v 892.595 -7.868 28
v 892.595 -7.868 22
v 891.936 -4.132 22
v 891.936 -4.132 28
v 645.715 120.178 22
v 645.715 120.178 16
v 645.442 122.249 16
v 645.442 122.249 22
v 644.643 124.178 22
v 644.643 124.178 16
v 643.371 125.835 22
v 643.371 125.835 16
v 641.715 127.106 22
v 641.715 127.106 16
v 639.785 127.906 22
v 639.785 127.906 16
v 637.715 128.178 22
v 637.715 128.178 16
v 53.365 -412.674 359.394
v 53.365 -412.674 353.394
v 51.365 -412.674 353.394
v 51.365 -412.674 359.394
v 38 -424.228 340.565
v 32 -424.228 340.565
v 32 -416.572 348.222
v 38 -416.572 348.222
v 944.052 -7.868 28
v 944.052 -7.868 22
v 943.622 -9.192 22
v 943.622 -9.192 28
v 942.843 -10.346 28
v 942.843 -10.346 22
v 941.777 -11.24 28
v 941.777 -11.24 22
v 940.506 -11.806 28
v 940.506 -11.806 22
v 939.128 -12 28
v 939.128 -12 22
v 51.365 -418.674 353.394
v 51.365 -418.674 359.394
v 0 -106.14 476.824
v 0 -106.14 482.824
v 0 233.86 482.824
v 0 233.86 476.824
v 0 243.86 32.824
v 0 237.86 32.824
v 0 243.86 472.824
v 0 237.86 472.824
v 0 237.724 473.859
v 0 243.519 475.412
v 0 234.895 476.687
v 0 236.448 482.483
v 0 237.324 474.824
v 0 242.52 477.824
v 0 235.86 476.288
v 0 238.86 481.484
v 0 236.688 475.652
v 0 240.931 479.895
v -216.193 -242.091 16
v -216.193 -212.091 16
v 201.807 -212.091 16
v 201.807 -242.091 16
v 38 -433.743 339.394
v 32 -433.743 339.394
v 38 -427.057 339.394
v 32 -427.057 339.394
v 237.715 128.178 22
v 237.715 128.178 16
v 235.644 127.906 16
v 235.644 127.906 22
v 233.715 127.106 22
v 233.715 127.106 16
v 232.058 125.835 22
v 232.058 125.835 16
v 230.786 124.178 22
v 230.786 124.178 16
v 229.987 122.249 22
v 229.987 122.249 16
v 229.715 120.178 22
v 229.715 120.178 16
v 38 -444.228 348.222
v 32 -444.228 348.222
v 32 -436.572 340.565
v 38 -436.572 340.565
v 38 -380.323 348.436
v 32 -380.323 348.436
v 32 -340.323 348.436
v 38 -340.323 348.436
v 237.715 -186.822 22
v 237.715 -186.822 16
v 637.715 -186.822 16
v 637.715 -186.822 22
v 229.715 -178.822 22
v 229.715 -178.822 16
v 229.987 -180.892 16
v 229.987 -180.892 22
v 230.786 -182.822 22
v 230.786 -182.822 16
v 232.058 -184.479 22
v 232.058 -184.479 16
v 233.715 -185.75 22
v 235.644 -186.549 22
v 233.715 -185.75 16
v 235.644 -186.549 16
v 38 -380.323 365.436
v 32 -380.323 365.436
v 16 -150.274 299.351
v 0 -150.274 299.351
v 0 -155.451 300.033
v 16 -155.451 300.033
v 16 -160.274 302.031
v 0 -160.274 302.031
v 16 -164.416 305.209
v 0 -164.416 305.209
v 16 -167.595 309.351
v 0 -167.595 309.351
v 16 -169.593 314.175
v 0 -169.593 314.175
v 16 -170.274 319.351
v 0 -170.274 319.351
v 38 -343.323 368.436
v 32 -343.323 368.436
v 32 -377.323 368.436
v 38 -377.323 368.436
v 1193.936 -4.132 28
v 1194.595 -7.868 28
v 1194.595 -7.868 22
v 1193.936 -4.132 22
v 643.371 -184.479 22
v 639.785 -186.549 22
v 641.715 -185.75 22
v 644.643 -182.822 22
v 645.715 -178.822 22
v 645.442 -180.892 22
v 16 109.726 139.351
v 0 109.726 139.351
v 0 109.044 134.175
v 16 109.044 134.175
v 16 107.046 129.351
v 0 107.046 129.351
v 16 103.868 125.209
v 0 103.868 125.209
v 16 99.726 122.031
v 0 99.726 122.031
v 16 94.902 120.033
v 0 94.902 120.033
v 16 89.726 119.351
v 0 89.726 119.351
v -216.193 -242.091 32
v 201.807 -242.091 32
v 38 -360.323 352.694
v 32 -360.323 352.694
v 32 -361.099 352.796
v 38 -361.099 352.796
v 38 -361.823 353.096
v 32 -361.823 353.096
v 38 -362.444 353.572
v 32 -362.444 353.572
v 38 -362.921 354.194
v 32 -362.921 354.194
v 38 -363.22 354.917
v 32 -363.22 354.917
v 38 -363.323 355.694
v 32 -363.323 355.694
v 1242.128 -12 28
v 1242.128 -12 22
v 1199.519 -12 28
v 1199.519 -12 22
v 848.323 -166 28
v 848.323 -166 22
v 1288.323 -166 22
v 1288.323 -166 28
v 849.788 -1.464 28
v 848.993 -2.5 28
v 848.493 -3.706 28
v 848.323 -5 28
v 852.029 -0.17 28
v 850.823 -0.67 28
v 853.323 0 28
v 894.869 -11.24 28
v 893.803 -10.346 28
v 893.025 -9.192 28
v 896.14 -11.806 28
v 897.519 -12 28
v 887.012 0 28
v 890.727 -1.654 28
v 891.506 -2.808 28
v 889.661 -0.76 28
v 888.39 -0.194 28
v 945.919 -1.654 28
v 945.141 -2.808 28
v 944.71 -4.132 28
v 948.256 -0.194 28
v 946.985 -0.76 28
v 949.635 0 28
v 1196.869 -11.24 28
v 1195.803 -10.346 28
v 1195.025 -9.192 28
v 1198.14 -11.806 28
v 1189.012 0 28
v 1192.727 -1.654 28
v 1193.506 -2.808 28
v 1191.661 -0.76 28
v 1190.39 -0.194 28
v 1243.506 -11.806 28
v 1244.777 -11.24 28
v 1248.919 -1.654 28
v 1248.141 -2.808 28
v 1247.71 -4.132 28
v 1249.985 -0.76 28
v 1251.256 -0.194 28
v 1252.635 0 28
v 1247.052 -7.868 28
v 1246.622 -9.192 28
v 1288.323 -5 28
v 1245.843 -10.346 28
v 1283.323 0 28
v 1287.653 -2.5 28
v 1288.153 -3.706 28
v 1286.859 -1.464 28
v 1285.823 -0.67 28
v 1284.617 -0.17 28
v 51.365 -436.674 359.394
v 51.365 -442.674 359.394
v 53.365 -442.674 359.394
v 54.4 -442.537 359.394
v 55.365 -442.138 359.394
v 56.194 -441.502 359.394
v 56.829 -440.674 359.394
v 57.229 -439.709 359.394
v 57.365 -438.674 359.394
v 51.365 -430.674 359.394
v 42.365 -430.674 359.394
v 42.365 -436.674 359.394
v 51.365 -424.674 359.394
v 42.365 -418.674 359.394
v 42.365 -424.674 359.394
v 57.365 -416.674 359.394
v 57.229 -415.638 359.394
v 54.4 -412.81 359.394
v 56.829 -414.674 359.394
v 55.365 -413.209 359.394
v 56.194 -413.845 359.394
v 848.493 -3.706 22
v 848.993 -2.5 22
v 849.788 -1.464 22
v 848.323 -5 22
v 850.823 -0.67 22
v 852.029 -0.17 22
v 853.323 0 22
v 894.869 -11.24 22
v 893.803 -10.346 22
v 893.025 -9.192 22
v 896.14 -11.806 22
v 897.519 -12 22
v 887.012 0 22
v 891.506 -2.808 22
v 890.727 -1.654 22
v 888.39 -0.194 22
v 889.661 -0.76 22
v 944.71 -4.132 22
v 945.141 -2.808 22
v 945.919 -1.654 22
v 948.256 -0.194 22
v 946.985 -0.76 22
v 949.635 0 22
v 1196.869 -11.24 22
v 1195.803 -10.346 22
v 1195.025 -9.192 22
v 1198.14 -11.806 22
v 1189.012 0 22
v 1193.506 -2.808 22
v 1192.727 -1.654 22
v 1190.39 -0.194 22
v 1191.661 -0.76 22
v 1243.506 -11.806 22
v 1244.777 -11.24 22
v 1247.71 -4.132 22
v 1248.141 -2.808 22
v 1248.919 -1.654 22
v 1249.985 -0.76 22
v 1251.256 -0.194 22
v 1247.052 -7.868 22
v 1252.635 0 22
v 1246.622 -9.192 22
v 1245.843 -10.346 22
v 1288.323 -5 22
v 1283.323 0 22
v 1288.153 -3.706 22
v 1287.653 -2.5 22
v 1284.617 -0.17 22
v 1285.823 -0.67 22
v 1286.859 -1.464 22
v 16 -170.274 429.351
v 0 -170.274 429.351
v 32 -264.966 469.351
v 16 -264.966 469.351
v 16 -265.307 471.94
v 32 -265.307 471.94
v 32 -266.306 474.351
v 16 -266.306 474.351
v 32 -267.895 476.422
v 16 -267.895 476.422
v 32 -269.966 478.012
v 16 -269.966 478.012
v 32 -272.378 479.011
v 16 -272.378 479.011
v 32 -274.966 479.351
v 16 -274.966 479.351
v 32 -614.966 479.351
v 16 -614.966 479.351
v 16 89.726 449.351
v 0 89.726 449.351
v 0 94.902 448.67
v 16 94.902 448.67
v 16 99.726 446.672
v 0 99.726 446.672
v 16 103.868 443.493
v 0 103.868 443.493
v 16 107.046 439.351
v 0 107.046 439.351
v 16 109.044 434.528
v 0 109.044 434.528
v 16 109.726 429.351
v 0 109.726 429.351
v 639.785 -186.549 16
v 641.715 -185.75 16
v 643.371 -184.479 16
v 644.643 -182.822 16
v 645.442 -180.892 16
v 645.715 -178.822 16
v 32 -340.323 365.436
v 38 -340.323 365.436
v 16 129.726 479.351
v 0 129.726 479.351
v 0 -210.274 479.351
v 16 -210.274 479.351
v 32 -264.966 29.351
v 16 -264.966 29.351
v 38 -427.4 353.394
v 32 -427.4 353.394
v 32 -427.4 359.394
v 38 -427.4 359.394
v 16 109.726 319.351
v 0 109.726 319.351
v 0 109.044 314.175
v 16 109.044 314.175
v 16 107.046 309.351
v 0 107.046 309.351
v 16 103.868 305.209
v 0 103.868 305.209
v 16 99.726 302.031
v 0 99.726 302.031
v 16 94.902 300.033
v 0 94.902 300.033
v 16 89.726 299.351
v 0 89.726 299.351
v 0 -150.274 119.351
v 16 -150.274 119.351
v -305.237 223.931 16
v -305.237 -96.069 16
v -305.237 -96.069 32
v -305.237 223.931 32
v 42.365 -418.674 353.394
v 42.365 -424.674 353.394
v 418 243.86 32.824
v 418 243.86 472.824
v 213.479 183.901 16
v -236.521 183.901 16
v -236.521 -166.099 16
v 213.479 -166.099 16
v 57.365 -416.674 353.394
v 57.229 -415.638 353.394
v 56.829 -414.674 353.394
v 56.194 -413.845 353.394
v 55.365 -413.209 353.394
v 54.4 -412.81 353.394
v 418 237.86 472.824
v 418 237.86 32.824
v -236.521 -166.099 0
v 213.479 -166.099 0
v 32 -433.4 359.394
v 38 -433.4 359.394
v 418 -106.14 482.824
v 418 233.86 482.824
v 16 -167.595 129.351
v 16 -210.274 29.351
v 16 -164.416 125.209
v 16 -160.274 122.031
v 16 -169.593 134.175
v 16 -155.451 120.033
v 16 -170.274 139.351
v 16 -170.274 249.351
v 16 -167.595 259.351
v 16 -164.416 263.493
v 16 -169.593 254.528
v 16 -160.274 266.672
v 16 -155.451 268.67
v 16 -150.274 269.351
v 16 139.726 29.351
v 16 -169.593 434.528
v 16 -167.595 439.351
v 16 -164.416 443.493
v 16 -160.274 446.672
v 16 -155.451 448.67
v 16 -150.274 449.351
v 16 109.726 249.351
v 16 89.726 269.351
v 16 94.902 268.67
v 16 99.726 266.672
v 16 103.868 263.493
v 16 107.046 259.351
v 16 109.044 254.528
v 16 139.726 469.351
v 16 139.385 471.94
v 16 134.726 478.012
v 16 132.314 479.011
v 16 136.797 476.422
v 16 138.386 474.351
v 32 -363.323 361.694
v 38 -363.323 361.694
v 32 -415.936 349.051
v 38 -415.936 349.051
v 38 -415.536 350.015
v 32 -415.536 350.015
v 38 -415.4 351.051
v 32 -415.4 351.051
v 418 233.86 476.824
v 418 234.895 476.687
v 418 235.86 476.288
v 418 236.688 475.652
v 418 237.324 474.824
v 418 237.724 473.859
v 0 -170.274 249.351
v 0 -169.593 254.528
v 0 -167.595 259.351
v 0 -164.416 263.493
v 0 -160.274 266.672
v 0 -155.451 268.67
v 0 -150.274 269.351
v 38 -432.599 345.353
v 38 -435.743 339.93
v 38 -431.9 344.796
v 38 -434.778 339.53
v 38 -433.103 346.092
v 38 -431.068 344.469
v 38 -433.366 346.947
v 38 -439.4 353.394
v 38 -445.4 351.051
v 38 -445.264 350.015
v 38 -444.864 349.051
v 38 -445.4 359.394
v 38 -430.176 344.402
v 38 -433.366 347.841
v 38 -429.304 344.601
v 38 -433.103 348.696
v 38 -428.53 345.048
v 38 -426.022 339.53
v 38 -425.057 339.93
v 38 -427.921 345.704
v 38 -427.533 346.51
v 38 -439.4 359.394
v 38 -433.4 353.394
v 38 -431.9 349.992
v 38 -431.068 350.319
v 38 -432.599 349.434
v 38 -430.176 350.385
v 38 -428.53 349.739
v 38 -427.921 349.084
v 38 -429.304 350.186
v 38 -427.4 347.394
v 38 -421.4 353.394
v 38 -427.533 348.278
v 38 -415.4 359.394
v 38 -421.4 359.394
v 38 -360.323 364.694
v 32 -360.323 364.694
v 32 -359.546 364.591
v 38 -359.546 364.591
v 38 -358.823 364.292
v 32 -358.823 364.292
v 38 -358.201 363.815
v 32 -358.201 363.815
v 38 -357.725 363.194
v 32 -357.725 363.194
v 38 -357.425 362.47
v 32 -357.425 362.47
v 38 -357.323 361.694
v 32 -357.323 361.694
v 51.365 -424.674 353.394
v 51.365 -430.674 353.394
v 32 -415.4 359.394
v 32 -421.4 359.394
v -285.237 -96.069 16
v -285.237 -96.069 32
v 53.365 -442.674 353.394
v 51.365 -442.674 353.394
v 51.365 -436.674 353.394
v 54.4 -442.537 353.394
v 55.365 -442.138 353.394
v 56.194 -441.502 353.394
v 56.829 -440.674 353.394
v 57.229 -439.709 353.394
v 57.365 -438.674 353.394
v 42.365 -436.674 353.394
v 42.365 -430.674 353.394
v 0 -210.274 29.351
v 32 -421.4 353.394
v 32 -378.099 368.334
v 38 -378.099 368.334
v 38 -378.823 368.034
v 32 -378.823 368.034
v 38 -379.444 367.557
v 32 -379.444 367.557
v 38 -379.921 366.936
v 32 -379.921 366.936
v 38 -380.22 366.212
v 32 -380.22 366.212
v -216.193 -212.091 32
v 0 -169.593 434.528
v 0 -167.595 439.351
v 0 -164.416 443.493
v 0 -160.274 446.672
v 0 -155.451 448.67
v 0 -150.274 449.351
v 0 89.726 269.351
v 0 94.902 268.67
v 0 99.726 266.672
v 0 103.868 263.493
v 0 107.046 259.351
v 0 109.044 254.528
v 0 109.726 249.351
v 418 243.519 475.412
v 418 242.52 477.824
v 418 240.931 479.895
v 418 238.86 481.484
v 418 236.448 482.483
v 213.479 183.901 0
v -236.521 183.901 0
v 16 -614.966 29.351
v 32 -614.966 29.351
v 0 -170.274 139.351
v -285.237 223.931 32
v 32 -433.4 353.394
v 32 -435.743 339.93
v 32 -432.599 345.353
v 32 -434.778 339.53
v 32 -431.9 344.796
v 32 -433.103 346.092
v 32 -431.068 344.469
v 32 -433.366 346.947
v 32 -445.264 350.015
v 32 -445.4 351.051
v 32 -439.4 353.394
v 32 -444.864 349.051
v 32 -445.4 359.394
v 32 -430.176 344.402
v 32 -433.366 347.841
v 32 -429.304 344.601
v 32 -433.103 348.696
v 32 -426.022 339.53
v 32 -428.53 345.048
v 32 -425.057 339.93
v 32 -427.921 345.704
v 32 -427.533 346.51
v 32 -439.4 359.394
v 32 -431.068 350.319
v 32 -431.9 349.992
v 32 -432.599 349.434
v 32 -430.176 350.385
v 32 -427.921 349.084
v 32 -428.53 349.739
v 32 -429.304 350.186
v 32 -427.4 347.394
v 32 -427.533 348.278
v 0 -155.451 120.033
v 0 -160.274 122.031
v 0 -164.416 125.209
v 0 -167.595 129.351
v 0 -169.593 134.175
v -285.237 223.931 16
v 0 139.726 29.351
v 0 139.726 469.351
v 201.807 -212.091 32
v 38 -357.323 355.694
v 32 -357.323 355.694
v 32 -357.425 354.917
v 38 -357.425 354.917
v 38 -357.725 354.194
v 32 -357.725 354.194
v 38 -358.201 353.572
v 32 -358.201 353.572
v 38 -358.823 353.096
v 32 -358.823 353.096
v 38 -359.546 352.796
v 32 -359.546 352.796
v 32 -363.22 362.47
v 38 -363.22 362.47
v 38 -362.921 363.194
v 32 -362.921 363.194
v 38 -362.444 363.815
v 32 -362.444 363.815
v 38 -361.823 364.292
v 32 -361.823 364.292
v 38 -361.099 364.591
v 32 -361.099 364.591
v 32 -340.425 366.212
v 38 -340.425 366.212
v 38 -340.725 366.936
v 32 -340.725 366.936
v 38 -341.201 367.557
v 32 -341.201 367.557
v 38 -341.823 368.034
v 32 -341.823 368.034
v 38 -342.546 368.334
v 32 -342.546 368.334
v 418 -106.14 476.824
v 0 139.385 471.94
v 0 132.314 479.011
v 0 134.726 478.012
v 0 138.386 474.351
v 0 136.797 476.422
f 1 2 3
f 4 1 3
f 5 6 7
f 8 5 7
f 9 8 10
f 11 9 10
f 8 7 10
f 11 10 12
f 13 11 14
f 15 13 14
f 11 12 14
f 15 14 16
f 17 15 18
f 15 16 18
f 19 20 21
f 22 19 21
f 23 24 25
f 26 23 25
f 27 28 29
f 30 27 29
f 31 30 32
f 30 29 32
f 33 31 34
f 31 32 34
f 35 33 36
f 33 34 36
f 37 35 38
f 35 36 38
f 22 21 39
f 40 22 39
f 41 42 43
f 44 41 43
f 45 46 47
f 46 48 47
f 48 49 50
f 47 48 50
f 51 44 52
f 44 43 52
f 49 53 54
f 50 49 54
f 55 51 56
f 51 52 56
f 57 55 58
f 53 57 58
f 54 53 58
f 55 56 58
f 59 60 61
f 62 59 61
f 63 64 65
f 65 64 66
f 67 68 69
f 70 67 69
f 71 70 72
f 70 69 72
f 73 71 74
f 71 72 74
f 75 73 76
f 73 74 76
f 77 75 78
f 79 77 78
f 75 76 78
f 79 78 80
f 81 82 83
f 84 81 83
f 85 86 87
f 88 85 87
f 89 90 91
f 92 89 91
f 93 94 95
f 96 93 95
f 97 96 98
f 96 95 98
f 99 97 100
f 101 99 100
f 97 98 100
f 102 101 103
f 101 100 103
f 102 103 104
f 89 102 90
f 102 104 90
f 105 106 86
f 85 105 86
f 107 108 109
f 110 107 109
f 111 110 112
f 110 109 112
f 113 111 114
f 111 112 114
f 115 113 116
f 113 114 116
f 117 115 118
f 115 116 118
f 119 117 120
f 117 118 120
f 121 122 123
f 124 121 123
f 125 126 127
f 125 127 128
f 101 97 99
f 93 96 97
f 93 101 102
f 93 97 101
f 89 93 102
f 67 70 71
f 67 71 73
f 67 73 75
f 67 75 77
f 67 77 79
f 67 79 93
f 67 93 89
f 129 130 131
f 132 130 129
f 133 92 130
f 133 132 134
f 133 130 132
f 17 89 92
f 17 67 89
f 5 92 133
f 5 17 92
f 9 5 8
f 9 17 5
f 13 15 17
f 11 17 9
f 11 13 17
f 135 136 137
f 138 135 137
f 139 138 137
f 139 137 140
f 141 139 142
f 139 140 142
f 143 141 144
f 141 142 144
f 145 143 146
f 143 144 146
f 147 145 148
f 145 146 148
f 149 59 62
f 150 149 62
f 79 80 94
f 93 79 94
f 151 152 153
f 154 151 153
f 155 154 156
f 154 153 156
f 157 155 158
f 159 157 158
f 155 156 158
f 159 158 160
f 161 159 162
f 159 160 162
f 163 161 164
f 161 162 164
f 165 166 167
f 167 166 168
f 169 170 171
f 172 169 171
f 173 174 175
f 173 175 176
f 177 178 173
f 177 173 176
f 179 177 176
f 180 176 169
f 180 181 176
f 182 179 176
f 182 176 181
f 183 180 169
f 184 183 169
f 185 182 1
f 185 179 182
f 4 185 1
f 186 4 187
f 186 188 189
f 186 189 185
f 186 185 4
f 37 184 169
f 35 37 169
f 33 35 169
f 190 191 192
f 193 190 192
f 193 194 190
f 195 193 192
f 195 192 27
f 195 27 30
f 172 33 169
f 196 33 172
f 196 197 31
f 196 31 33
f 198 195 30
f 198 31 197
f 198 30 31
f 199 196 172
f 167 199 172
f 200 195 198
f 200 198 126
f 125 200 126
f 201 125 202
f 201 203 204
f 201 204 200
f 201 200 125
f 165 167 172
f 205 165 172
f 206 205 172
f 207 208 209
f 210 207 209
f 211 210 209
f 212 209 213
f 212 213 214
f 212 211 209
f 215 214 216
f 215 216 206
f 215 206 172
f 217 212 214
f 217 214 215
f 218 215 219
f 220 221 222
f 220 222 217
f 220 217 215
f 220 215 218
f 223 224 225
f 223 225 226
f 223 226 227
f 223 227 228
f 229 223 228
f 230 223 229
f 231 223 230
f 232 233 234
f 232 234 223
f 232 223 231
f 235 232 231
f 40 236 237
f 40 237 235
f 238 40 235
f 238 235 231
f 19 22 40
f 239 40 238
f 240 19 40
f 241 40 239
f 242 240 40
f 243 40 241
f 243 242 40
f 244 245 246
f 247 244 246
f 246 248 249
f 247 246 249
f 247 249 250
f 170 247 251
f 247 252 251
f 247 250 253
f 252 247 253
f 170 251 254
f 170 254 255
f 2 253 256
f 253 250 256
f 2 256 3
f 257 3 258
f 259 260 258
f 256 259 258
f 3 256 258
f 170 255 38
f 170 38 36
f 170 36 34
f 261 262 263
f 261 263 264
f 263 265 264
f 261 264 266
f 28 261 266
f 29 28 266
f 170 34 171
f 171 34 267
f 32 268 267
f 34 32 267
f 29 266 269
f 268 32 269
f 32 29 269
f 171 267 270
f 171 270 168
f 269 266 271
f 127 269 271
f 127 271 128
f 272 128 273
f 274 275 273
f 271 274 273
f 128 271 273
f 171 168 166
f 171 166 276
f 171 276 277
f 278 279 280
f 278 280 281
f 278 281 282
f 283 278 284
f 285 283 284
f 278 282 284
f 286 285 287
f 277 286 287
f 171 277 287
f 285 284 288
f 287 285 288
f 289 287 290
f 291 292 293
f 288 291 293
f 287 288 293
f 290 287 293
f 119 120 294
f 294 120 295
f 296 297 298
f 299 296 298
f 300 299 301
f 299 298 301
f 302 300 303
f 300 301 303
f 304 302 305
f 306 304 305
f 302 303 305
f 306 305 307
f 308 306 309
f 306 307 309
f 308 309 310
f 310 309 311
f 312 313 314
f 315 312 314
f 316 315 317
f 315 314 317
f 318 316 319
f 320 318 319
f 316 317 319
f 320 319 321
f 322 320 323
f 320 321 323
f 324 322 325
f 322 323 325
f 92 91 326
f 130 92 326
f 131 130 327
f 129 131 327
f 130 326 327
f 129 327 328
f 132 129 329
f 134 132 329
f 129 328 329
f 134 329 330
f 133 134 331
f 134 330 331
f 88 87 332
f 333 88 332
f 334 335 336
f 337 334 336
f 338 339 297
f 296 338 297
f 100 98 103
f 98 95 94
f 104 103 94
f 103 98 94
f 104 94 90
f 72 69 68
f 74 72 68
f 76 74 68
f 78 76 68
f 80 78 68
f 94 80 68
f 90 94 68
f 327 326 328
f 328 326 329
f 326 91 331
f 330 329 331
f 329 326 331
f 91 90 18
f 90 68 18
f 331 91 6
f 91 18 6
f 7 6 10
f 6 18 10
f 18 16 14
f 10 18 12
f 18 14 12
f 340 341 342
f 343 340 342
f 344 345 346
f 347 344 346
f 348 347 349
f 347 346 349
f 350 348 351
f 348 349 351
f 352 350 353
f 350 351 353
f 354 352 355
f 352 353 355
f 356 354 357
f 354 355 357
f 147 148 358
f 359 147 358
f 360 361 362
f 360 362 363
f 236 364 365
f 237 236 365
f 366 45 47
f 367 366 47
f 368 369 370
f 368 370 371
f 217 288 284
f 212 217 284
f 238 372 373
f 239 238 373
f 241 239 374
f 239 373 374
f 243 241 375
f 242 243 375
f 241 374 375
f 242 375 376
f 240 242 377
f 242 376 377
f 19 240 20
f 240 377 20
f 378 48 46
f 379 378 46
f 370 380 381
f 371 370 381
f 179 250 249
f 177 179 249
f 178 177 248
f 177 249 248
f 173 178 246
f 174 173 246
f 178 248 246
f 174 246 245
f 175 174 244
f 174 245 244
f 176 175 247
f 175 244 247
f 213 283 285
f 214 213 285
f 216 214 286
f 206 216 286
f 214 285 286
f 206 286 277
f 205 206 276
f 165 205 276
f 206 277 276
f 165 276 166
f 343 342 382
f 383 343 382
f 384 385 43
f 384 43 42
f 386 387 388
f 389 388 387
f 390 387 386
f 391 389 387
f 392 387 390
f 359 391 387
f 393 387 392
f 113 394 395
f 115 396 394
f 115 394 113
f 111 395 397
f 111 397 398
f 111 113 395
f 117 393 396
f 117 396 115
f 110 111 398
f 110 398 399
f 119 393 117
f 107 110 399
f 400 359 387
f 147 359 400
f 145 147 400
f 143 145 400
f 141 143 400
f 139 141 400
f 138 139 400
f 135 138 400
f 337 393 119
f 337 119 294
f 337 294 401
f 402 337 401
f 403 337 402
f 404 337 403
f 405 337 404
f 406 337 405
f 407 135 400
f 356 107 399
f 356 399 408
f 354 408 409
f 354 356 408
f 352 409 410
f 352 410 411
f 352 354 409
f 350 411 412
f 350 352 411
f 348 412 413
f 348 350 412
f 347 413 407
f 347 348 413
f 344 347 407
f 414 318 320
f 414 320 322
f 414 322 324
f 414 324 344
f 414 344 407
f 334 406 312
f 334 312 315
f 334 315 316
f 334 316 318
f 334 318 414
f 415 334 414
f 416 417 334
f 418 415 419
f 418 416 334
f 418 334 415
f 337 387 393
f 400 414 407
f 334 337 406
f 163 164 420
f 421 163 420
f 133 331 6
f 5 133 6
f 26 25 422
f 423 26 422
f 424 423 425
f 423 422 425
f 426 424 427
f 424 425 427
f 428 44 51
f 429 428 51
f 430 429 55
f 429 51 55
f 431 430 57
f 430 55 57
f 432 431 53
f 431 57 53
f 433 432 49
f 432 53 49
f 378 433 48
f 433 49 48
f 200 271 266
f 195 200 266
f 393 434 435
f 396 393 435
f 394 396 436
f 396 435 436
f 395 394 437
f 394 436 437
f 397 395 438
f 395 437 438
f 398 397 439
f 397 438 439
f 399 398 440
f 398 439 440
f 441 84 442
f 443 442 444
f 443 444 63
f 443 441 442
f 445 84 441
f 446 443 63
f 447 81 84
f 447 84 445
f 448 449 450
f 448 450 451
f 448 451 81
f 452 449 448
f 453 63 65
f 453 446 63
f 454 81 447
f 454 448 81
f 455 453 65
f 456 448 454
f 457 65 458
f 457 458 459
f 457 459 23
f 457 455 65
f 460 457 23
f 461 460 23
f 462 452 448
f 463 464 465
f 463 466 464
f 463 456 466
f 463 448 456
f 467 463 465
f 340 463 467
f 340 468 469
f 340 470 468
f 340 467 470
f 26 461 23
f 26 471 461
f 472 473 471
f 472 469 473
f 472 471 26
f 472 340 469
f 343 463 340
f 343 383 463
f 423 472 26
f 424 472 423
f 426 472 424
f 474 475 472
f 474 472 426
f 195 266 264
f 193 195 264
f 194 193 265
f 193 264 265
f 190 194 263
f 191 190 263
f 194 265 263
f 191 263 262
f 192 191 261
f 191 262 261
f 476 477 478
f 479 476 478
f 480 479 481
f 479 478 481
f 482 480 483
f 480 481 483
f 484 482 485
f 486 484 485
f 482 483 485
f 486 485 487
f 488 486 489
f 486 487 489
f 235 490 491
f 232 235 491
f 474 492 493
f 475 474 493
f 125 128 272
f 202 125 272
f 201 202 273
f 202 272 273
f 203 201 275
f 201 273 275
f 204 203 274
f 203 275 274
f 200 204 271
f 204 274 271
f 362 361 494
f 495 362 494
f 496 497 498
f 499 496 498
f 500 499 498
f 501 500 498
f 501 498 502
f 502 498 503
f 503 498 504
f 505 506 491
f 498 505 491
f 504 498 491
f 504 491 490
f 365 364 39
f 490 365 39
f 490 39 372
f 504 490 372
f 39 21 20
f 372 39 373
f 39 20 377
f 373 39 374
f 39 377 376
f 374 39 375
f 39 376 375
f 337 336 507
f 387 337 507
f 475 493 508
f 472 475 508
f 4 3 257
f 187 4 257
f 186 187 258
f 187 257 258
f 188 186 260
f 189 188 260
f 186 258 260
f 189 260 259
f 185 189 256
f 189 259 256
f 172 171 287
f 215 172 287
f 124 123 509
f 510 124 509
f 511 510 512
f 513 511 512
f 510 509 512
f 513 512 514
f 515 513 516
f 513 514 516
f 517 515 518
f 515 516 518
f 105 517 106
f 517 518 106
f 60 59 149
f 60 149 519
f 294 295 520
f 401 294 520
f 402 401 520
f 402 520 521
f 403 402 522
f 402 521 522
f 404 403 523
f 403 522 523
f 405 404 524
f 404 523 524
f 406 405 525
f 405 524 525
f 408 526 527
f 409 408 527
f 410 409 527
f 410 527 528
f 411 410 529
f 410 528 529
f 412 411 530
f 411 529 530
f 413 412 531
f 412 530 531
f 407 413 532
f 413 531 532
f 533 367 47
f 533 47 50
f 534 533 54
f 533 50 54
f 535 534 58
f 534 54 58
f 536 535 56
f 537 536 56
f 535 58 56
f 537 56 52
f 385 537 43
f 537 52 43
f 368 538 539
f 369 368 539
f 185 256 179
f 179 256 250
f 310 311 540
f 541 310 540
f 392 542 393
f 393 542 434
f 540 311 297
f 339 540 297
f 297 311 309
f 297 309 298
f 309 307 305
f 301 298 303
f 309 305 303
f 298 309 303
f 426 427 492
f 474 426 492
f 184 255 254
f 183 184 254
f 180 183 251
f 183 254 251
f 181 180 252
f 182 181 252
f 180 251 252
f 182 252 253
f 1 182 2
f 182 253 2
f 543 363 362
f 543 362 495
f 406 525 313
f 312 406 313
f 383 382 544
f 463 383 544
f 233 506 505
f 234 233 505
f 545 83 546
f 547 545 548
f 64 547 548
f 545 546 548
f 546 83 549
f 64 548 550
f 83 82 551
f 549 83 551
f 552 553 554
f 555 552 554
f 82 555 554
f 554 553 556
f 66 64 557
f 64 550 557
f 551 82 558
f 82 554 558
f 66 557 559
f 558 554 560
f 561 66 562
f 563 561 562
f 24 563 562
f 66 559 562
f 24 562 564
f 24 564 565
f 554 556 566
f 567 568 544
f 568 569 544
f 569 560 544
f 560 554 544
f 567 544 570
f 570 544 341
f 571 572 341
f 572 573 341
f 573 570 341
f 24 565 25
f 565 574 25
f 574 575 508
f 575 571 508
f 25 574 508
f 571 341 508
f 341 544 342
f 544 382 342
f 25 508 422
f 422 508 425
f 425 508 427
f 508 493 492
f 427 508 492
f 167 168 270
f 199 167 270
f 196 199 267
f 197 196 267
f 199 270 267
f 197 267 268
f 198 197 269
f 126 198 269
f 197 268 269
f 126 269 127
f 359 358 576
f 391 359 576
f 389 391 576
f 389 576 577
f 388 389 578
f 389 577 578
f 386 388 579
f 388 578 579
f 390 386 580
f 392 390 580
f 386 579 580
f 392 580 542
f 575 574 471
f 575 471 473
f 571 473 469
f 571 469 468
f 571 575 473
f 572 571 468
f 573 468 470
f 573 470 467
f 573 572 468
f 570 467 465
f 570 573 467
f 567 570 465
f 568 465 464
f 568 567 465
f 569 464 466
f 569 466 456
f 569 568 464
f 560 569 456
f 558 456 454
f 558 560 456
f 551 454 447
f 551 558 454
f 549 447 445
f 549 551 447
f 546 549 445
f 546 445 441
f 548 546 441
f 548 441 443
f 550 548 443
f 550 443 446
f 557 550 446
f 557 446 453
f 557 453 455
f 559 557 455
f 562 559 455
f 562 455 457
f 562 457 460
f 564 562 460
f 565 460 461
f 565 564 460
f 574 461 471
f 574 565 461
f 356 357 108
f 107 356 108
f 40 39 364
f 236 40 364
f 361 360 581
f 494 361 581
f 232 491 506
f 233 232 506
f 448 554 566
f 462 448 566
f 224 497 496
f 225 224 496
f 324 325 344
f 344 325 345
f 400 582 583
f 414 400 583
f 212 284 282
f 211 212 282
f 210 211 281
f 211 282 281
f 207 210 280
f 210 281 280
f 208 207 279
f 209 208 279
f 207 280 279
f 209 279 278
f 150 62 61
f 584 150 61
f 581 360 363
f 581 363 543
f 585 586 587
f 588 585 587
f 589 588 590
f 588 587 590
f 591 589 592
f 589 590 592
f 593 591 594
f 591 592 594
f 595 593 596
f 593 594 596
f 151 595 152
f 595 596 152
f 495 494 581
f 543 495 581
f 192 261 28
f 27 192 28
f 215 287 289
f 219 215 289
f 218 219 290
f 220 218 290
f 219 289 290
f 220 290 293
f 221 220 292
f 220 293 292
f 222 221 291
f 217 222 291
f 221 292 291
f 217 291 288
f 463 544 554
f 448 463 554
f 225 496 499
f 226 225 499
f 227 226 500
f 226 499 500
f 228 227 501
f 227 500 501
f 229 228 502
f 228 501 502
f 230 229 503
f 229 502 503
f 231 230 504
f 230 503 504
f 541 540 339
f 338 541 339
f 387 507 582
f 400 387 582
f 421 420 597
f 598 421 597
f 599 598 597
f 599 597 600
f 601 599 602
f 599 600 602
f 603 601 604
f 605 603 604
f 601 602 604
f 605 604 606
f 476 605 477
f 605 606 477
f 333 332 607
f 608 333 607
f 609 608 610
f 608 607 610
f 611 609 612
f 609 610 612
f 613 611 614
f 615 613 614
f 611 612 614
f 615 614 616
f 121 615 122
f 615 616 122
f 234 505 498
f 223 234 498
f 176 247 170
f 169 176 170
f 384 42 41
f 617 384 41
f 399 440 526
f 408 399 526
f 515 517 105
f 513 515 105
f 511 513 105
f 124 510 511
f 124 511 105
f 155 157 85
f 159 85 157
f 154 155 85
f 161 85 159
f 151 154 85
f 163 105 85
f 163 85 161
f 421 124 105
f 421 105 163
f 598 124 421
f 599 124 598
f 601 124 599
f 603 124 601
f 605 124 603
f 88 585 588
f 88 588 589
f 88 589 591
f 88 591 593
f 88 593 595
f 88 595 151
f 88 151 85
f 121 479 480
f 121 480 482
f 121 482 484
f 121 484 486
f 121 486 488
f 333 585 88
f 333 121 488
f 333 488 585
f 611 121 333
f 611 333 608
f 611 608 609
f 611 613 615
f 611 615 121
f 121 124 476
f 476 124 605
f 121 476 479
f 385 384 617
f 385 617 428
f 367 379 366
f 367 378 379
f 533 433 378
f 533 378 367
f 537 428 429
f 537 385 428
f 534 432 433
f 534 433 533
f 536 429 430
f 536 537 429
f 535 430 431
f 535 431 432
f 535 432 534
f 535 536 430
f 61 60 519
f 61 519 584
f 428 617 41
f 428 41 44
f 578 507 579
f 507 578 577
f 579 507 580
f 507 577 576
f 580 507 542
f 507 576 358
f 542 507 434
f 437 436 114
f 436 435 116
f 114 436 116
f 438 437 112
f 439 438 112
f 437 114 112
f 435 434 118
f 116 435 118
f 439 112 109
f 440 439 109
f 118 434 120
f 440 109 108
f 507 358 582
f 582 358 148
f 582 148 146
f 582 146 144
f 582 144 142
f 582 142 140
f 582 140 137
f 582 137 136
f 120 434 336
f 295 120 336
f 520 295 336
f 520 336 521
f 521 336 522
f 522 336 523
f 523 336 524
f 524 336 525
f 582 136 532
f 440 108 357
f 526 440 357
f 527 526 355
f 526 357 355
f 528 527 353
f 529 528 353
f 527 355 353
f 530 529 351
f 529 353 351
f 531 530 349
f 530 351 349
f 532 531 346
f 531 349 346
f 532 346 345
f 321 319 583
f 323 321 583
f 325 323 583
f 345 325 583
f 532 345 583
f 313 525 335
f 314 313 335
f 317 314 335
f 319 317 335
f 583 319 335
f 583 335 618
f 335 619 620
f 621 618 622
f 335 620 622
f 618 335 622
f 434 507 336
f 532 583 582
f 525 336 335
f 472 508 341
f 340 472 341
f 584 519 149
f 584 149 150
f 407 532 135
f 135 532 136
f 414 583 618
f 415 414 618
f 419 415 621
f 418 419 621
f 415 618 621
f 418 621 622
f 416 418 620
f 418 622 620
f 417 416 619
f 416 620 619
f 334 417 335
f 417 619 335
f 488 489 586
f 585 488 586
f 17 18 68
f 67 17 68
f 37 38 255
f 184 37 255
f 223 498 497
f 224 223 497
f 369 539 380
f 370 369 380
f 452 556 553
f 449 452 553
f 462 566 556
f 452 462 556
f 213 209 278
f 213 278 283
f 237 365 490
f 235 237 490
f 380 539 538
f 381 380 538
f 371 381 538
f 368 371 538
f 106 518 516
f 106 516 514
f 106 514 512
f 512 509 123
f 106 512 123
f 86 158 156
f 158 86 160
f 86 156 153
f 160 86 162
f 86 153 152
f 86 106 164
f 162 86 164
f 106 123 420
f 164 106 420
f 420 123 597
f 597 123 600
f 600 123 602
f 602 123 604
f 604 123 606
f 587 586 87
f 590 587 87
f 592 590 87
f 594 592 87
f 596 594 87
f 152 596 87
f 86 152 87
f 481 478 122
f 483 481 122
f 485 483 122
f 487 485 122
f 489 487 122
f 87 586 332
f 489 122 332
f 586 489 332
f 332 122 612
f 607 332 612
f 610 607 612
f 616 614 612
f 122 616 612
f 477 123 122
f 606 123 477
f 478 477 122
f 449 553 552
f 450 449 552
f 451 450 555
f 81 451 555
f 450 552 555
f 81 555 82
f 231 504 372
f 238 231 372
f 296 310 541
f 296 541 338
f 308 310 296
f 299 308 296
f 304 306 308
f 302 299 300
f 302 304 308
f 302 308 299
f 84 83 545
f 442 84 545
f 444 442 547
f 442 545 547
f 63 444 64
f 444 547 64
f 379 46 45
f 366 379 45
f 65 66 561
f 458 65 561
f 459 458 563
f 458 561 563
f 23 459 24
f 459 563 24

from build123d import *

# Parameters (mm, degrees)
F1_DEPTH  = 16
F3_DEPTH  = 16
F5_DEPTH  = 418
F7_DEPTH  = 16
F8_W      = 418
F8_H      = 30
F9_DEPTH  = 16
F10_W     = 20
F10_H     = 320
F11_DEPTH = 16
F13_DEPTH = 6
F15_DEPTH = 6
F16_R     = 3
F17_DEPTH = 6
F19_DEPTH = 6
F21_DEPTH = 6


with BuildPart() as f1:
    # F0 (on Top) → F1 (new body)
    with BuildSketch(Plane.XY):
        Polygon((213.479372, 183.901393), (-236.520628, 183.901393), (-236.520628, -151.098607), (-236.520628, -166.098607), (-221.520628, -166.098607), (198.479372, -166.098607), (213.479372, -166.098607), (213.479372, -151.098607), align=None)
    extrude(amount=F1_DEPTH)


with BuildPart() as f3:
    # F2 (on Right) → F3 (new body)
    with BuildSketch(Plane.YZ):
        with BuildLine():
            Line((-210.274261, 479.351352), (-210.274261, 29.351352))
            Line((-210.274261, 29.351352), (139.725739, 29.351352))
            Line((139.725739, 29.351352), (139.725739, 469.351352))
            ThreePointArc((139.725739, 469.351352), (136.796807, 476.42242), (129.725739, 479.351352))
            Line((129.725739, 479.351352), (-210.274261, 479.351352))
        make_face()
        with BuildLine():
            ThreePointArc((-170.274261, 249.351352), (-164.416397, 263.493487), (-150.274261, 269.351352))
            Line((-150.274261, 269.351352), (89.725739, 269.351352))
            ThreePointArc((89.725739, 269.351352), (103.867874, 263.493487), (109.725739, 249.351352))
            Line((109.725739, 249.351352), (109.725739, 139.351352))
            ThreePointArc((109.725739, 139.351352), (103.867874, 125.209216), (89.725739, 119.351352))
            Line((89.725739, 119.351352), (-150.274261, 119.351352))
            ThreePointArc((-150.274261, 119.351352), (-164.416397, 125.209216), (-170.274261, 139.351352))
            Line((-170.274261, 139.351352), (-170.274261, 249.351352))
        make_face(mode=Mode.SUBTRACT)
        with BuildLine():
            ThreePointArc((-170.274261, 429.351352), (-164.416397, 443.493487), (-150.274261, 449.351352))
            Line((-150.274261, 449.351352), (89.725739, 449.351352))
            ThreePointArc((89.725739, 449.351352), (103.867874, 443.493487), (109.725739, 429.351352))
            Line((109.725739, 429.351352), (109.725739, 319.351352))
            ThreePointArc((109.725739, 319.351352), (103.867874, 305.209216), (89.725739, 299.351352))
            Line((89.725739, 299.351352), (-150.274261, 299.351352))
            ThreePointArc((-150.274261, 299.351352), (-164.416397, 305.209216), (-170.274261, 319.351352))
            Line((-170.274261, 319.351352), (-170.274261, 429.351352))
        make_face(mode=Mode.SUBTRACT)
    extrude(amount=F3_DEPTH)


with BuildPart() as f5:
    # F4 (on Right) → F5 (new body)
    with BuildSketch(Plane.YZ):
        with BuildLine():
            Line((237.859797, 32.823731), (243.859797, 32.823731))
            Line((243.859797, 32.823731), (243.859797, 472.823731))
            ThreePointArc((243.859797, 472.823731), (240.930865, 479.894799), (233.859797, 482.823731))
            Line((233.859797, 482.823731), (-106.140203, 482.823731))
            Line((-106.140203, 482.823731), (-106.140203, 476.823731))
            Line((-106.140203, 476.823731), (233.859797, 476.823731))
            ThreePointArc((233.859797, 476.823731), (236.688224, 475.652158), (237.859797, 472.823731))
            Line((237.859797, 472.823731), (237.859797, 32.823731))
        make_face()
    extrude(amount=F5_DEPTH)


with BuildPart() as f7:
    # F6 (on face) → F7 (new body)
    with BuildSketch(Plane.YZ.offset(16)):
        with BuildLine():
            Line((-614.965916, 479.351352), (-614.965916, 29.351352))
            Line((-614.965916, 29.351352), (-264.965916, 29.351352))
            Line((-264.965916, 29.351352), (-264.965916, 469.351352))
            ThreePointArc((-264.965916, 469.351352), (-267.894848, 476.42242), (-274.965916, 479.351352))
            Line((-274.965916, 479.351352), (-614.965916, 479.351352))
        make_face()
    extrude(amount=F7_DEPTH)


with BuildPart() as f9:
    # F8 (on face) → F9 (new body)
    with BuildSketch(Plane.XY.offset(16)):
        with Locations((-7.193144, -227.09062)):
            Rectangle(F8_W, F8_H)
    extrude(amount=F9_DEPTH)


with BuildPart() as f11:
    # F10 (on face) → F11 (new body)
    with BuildSketch(Plane.XY.offset(16)):
        with Locations((-295.236692, 63.931197)):
            Rectangle(F10_W, F10_H)
    extrude(amount=F11_DEPTH)


with BuildPart() as f13:
    # F12 (on face) → F13 (new body)
    with BuildSketch(Plane.XY.offset(16)):
        with BuildLine():
            ThreePointArc((229.714536, -178.821809), (232.057682, -184.478663), (237.714536, -186.821809))
            Line((237.714536, -186.821809), (637.714536, -186.821809))
            ThreePointArc((637.714536, -186.821809), (643.37139, -184.478663), (645.714536, -178.821809))
            Line((645.714536, -178.821809), (645.714536, 120.178191))
            ThreePointArc((645.714536, 120.178191), (643.37139, 125.835046), (637.714536, 128.178191))
            Line((637.714536, 128.178191), (237.714536, 128.178191))
            ThreePointArc((237.714536, 128.178191), (232.057682, 125.835046), (229.714536, 120.178191))
            Line((229.714536, 120.178191), (229.714536, -178.821809))
        make_face()
    extrude(amount=F13_DEPTH)


with BuildPart() as f15:
    # F14 (on face) → F15 (new body)
    with BuildSketch(Plane.XY.offset(22)):
        with BuildLine():
            Line((848.323096, -5), (848.323096, -166))
            Line((848.323096, -166), (1288.323096, -166))
            Line((1288.323096, -166), (1288.323096, -5))
            ThreePointArc((1288.323096, -5), (1286.85863, -1.464466), (1283.323096, 0))
            Line((1283.323096, 0), (1252.634518, 0))
            ThreePointArc((1252.634518, 0), (1249.42058, -1.169778), (1247.710479, -4.131759))
            Line((1247.710479, -4.131759), (1247.051637, -7.868241))
            ThreePointArc((1247.051637, -7.868241), (1245.341536, -10.830222), (1242.127598, -12))
            Line((1242.127598, -12), (1199.518594, -12))
            ThreePointArc((1199.518594, -12), (1196.304656, -10.830222), (1194.594555, -7.868241))
            Line((1194.594555, -7.868241), (1193.935713, -4.131759))
            ThreePointArc((1193.935713, -4.131759), (1192.225612, -1.169778), (1189.011674, 0))
            Line((1189.011674, 0), (949.634518, 0))
            ThreePointArc((949.634518, 0), (946.42058, -1.169778), (944.710479, -4.131759))
            Line((944.710479, -4.131759), (944.051637, -7.868241))
            ThreePointArc((944.051637, -7.868241), (942.341536, -10.830222), (939.127598, -12))
            Line((939.127598, -12), (897.518594, -12))
            ThreePointArc((897.518594, -12), (894.304656, -10.830222), (892.594555, -7.868241))
            Line((892.594555, -7.868241), (891.935713, -4.131759))
            ThreePointArc((891.935713, -4.131759), (890.225612, -1.169778), (887.011674, 0))
            Line((887.011674, 0), (853.323096, 0))
            ThreePointArc((853.323096, 0), (849.787562, -1.464466), (848.323096, -5))
        make_face()
    extrude(amount=F15_DEPTH)


with BuildPart() as f17:
    # F16 (on face) → F17 (new body)
    with BuildSketch(Plane.YZ.offset(32)):
        with BuildLine():
            Line((-439.399974, 359.393865), (-445.399974, 359.393865))
            Line((-445.399974, 359.393865), (-445.399974, 351.05072))
            ThreePointArc((-445.399974, 351.05072), (-445.095492, 349.519986), (-444.228401, 348.222293))
            Line((-444.228401, 348.222293), (-436.571547, 340.565438))
            ThreePointArc((-436.571547, 340.565438), (-435.273853, 339.698347), (-433.74312, 339.393865))
            Line((-433.74312, 339.393865), (-427.056828, 339.393865))
            ThreePointArc((-427.056828, 339.393865), (-425.526095, 339.698347), (-424.228401, 340.565438))
            Line((-424.228401, 340.565438), (-416.571547, 348.222293))
            ThreePointArc((-416.571547, 348.222293), (-415.704456, 349.519986), (-415.399974, 351.05072))
            Line((-415.399974, 351.05072), (-415.399974, 359.393865))
            Line((-415.399974, 359.393865), (-421.399974, 359.393865))
            Line((-421.399974, 359.393865), (-421.399974, 353.393865))
            Line((-421.399974, 353.393865), (-427.399974, 353.393865))
            Line((-427.399974, 353.393865), (-427.399974, 359.393865))
            Line((-427.399974, 359.393865), (-433.399974, 359.393865))
            Line((-433.399974, 359.393865), (-433.399974, 353.393865))
            Line((-433.399974, 353.393865), (-439.399974, 353.393865))
            Line((-439.399974, 353.393865), (-439.399974, 359.393865))
        make_face()
        with Locations((-430.399974, 347.393865)):
            Circle(F16_R, mode=Mode.SUBTRACT)
    extrude(amount=F17_DEPTH)


with BuildPart() as f19:
    # F18 (on face) → F19 (new body)
    with BuildSketch(Plane.XY.offset(353.393865)):
        with BuildLine():
            Line((53.36509, -412.673558), (51.36509, -412.673558))
            Line((51.36509, -412.673558), (51.36509, -418.673558))
            Line((51.36509, -418.673558), (42.36509, -418.673558))
            Line((42.36509, -418.673558), (42.36509, -424.673558))
            Line((42.36509, -424.673558), (51.36509, -424.673558))
            Line((51.36509, -424.673558), (51.36509, -430.673558))
            Line((51.36509, -430.673558), (42.36509, -430.673558))
            Line((42.36509, -430.673558), (42.36509, -436.673558))
            Line((42.36509, -436.673558), (51.36509, -436.673558))
            Line((51.36509, -436.673558), (51.36509, -442.673558))
            Line((51.36509, -442.673558), (53.36509, -442.673558))
            ThreePointArc((53.36509, -442.673558), (56.193517, -441.501985), (57.36509, -438.673558))
            Line((57.36509, -438.673558), (57.36509, -416.673558))
            ThreePointArc((57.36509, -416.673558), (56.193517, -413.845131), (53.36509, -412.673558))
        make_face()
    extrude(amount=F19_DEPTH)


with BuildPart() as f21:
    # F20 (on face) → F21 (new body)
    with BuildSketch(Plane.YZ.offset(32)):
        with BuildLine():
            Line((-343.322595, 368.435969), (-377.322595, 368.435969))
            ThreePointArc((-377.322595, 368.435969), (-379.443915, 367.557289), (-380.322595, 365.435969))
            Line((-380.322595, 365.435969), (-380.322595, 348.435969))
            Line((-380.322595, 348.435969), (-340.322595, 348.435969))
            Line((-340.322595, 348.435969), (-340.322595, 365.435969))
            ThreePointArc((-340.322595, 365.435969), (-341.201274, 367.557289), (-343.322595, 368.435969))
        make_face()
        with BuildLine():
            ThreePointArc((-360.322595, 364.693689), (-358.201274, 363.815009), (-357.322595, 361.693689))
            Line((-357.322595, 361.693689), (-357.322595, 355.693689))
            ThreePointArc((-357.322595, 355.693689), (-358.201274, 353.572369), (-360.322595, 352.693689))
            ThreePointArc((-360.322595, 352.693689), (-362.443915, 353.572369), (-363.322595, 355.693689))
            Line((-363.322595, 355.693689), (-363.322595, 361.693689))
            ThreePointArc((-363.322595, 361.693689), (-362.443915, 363.815009), (-360.322595, 364.693689))
        make_face(mode=Mode.SUBTRACT)
    extrude(amount=F21_DEPTH)


solid = Compound([f1.part, f3.part, f5.part, f7.part, f9.part, f11.part, f13.part, f15.part, f17.part, f19.part, f21.part])
